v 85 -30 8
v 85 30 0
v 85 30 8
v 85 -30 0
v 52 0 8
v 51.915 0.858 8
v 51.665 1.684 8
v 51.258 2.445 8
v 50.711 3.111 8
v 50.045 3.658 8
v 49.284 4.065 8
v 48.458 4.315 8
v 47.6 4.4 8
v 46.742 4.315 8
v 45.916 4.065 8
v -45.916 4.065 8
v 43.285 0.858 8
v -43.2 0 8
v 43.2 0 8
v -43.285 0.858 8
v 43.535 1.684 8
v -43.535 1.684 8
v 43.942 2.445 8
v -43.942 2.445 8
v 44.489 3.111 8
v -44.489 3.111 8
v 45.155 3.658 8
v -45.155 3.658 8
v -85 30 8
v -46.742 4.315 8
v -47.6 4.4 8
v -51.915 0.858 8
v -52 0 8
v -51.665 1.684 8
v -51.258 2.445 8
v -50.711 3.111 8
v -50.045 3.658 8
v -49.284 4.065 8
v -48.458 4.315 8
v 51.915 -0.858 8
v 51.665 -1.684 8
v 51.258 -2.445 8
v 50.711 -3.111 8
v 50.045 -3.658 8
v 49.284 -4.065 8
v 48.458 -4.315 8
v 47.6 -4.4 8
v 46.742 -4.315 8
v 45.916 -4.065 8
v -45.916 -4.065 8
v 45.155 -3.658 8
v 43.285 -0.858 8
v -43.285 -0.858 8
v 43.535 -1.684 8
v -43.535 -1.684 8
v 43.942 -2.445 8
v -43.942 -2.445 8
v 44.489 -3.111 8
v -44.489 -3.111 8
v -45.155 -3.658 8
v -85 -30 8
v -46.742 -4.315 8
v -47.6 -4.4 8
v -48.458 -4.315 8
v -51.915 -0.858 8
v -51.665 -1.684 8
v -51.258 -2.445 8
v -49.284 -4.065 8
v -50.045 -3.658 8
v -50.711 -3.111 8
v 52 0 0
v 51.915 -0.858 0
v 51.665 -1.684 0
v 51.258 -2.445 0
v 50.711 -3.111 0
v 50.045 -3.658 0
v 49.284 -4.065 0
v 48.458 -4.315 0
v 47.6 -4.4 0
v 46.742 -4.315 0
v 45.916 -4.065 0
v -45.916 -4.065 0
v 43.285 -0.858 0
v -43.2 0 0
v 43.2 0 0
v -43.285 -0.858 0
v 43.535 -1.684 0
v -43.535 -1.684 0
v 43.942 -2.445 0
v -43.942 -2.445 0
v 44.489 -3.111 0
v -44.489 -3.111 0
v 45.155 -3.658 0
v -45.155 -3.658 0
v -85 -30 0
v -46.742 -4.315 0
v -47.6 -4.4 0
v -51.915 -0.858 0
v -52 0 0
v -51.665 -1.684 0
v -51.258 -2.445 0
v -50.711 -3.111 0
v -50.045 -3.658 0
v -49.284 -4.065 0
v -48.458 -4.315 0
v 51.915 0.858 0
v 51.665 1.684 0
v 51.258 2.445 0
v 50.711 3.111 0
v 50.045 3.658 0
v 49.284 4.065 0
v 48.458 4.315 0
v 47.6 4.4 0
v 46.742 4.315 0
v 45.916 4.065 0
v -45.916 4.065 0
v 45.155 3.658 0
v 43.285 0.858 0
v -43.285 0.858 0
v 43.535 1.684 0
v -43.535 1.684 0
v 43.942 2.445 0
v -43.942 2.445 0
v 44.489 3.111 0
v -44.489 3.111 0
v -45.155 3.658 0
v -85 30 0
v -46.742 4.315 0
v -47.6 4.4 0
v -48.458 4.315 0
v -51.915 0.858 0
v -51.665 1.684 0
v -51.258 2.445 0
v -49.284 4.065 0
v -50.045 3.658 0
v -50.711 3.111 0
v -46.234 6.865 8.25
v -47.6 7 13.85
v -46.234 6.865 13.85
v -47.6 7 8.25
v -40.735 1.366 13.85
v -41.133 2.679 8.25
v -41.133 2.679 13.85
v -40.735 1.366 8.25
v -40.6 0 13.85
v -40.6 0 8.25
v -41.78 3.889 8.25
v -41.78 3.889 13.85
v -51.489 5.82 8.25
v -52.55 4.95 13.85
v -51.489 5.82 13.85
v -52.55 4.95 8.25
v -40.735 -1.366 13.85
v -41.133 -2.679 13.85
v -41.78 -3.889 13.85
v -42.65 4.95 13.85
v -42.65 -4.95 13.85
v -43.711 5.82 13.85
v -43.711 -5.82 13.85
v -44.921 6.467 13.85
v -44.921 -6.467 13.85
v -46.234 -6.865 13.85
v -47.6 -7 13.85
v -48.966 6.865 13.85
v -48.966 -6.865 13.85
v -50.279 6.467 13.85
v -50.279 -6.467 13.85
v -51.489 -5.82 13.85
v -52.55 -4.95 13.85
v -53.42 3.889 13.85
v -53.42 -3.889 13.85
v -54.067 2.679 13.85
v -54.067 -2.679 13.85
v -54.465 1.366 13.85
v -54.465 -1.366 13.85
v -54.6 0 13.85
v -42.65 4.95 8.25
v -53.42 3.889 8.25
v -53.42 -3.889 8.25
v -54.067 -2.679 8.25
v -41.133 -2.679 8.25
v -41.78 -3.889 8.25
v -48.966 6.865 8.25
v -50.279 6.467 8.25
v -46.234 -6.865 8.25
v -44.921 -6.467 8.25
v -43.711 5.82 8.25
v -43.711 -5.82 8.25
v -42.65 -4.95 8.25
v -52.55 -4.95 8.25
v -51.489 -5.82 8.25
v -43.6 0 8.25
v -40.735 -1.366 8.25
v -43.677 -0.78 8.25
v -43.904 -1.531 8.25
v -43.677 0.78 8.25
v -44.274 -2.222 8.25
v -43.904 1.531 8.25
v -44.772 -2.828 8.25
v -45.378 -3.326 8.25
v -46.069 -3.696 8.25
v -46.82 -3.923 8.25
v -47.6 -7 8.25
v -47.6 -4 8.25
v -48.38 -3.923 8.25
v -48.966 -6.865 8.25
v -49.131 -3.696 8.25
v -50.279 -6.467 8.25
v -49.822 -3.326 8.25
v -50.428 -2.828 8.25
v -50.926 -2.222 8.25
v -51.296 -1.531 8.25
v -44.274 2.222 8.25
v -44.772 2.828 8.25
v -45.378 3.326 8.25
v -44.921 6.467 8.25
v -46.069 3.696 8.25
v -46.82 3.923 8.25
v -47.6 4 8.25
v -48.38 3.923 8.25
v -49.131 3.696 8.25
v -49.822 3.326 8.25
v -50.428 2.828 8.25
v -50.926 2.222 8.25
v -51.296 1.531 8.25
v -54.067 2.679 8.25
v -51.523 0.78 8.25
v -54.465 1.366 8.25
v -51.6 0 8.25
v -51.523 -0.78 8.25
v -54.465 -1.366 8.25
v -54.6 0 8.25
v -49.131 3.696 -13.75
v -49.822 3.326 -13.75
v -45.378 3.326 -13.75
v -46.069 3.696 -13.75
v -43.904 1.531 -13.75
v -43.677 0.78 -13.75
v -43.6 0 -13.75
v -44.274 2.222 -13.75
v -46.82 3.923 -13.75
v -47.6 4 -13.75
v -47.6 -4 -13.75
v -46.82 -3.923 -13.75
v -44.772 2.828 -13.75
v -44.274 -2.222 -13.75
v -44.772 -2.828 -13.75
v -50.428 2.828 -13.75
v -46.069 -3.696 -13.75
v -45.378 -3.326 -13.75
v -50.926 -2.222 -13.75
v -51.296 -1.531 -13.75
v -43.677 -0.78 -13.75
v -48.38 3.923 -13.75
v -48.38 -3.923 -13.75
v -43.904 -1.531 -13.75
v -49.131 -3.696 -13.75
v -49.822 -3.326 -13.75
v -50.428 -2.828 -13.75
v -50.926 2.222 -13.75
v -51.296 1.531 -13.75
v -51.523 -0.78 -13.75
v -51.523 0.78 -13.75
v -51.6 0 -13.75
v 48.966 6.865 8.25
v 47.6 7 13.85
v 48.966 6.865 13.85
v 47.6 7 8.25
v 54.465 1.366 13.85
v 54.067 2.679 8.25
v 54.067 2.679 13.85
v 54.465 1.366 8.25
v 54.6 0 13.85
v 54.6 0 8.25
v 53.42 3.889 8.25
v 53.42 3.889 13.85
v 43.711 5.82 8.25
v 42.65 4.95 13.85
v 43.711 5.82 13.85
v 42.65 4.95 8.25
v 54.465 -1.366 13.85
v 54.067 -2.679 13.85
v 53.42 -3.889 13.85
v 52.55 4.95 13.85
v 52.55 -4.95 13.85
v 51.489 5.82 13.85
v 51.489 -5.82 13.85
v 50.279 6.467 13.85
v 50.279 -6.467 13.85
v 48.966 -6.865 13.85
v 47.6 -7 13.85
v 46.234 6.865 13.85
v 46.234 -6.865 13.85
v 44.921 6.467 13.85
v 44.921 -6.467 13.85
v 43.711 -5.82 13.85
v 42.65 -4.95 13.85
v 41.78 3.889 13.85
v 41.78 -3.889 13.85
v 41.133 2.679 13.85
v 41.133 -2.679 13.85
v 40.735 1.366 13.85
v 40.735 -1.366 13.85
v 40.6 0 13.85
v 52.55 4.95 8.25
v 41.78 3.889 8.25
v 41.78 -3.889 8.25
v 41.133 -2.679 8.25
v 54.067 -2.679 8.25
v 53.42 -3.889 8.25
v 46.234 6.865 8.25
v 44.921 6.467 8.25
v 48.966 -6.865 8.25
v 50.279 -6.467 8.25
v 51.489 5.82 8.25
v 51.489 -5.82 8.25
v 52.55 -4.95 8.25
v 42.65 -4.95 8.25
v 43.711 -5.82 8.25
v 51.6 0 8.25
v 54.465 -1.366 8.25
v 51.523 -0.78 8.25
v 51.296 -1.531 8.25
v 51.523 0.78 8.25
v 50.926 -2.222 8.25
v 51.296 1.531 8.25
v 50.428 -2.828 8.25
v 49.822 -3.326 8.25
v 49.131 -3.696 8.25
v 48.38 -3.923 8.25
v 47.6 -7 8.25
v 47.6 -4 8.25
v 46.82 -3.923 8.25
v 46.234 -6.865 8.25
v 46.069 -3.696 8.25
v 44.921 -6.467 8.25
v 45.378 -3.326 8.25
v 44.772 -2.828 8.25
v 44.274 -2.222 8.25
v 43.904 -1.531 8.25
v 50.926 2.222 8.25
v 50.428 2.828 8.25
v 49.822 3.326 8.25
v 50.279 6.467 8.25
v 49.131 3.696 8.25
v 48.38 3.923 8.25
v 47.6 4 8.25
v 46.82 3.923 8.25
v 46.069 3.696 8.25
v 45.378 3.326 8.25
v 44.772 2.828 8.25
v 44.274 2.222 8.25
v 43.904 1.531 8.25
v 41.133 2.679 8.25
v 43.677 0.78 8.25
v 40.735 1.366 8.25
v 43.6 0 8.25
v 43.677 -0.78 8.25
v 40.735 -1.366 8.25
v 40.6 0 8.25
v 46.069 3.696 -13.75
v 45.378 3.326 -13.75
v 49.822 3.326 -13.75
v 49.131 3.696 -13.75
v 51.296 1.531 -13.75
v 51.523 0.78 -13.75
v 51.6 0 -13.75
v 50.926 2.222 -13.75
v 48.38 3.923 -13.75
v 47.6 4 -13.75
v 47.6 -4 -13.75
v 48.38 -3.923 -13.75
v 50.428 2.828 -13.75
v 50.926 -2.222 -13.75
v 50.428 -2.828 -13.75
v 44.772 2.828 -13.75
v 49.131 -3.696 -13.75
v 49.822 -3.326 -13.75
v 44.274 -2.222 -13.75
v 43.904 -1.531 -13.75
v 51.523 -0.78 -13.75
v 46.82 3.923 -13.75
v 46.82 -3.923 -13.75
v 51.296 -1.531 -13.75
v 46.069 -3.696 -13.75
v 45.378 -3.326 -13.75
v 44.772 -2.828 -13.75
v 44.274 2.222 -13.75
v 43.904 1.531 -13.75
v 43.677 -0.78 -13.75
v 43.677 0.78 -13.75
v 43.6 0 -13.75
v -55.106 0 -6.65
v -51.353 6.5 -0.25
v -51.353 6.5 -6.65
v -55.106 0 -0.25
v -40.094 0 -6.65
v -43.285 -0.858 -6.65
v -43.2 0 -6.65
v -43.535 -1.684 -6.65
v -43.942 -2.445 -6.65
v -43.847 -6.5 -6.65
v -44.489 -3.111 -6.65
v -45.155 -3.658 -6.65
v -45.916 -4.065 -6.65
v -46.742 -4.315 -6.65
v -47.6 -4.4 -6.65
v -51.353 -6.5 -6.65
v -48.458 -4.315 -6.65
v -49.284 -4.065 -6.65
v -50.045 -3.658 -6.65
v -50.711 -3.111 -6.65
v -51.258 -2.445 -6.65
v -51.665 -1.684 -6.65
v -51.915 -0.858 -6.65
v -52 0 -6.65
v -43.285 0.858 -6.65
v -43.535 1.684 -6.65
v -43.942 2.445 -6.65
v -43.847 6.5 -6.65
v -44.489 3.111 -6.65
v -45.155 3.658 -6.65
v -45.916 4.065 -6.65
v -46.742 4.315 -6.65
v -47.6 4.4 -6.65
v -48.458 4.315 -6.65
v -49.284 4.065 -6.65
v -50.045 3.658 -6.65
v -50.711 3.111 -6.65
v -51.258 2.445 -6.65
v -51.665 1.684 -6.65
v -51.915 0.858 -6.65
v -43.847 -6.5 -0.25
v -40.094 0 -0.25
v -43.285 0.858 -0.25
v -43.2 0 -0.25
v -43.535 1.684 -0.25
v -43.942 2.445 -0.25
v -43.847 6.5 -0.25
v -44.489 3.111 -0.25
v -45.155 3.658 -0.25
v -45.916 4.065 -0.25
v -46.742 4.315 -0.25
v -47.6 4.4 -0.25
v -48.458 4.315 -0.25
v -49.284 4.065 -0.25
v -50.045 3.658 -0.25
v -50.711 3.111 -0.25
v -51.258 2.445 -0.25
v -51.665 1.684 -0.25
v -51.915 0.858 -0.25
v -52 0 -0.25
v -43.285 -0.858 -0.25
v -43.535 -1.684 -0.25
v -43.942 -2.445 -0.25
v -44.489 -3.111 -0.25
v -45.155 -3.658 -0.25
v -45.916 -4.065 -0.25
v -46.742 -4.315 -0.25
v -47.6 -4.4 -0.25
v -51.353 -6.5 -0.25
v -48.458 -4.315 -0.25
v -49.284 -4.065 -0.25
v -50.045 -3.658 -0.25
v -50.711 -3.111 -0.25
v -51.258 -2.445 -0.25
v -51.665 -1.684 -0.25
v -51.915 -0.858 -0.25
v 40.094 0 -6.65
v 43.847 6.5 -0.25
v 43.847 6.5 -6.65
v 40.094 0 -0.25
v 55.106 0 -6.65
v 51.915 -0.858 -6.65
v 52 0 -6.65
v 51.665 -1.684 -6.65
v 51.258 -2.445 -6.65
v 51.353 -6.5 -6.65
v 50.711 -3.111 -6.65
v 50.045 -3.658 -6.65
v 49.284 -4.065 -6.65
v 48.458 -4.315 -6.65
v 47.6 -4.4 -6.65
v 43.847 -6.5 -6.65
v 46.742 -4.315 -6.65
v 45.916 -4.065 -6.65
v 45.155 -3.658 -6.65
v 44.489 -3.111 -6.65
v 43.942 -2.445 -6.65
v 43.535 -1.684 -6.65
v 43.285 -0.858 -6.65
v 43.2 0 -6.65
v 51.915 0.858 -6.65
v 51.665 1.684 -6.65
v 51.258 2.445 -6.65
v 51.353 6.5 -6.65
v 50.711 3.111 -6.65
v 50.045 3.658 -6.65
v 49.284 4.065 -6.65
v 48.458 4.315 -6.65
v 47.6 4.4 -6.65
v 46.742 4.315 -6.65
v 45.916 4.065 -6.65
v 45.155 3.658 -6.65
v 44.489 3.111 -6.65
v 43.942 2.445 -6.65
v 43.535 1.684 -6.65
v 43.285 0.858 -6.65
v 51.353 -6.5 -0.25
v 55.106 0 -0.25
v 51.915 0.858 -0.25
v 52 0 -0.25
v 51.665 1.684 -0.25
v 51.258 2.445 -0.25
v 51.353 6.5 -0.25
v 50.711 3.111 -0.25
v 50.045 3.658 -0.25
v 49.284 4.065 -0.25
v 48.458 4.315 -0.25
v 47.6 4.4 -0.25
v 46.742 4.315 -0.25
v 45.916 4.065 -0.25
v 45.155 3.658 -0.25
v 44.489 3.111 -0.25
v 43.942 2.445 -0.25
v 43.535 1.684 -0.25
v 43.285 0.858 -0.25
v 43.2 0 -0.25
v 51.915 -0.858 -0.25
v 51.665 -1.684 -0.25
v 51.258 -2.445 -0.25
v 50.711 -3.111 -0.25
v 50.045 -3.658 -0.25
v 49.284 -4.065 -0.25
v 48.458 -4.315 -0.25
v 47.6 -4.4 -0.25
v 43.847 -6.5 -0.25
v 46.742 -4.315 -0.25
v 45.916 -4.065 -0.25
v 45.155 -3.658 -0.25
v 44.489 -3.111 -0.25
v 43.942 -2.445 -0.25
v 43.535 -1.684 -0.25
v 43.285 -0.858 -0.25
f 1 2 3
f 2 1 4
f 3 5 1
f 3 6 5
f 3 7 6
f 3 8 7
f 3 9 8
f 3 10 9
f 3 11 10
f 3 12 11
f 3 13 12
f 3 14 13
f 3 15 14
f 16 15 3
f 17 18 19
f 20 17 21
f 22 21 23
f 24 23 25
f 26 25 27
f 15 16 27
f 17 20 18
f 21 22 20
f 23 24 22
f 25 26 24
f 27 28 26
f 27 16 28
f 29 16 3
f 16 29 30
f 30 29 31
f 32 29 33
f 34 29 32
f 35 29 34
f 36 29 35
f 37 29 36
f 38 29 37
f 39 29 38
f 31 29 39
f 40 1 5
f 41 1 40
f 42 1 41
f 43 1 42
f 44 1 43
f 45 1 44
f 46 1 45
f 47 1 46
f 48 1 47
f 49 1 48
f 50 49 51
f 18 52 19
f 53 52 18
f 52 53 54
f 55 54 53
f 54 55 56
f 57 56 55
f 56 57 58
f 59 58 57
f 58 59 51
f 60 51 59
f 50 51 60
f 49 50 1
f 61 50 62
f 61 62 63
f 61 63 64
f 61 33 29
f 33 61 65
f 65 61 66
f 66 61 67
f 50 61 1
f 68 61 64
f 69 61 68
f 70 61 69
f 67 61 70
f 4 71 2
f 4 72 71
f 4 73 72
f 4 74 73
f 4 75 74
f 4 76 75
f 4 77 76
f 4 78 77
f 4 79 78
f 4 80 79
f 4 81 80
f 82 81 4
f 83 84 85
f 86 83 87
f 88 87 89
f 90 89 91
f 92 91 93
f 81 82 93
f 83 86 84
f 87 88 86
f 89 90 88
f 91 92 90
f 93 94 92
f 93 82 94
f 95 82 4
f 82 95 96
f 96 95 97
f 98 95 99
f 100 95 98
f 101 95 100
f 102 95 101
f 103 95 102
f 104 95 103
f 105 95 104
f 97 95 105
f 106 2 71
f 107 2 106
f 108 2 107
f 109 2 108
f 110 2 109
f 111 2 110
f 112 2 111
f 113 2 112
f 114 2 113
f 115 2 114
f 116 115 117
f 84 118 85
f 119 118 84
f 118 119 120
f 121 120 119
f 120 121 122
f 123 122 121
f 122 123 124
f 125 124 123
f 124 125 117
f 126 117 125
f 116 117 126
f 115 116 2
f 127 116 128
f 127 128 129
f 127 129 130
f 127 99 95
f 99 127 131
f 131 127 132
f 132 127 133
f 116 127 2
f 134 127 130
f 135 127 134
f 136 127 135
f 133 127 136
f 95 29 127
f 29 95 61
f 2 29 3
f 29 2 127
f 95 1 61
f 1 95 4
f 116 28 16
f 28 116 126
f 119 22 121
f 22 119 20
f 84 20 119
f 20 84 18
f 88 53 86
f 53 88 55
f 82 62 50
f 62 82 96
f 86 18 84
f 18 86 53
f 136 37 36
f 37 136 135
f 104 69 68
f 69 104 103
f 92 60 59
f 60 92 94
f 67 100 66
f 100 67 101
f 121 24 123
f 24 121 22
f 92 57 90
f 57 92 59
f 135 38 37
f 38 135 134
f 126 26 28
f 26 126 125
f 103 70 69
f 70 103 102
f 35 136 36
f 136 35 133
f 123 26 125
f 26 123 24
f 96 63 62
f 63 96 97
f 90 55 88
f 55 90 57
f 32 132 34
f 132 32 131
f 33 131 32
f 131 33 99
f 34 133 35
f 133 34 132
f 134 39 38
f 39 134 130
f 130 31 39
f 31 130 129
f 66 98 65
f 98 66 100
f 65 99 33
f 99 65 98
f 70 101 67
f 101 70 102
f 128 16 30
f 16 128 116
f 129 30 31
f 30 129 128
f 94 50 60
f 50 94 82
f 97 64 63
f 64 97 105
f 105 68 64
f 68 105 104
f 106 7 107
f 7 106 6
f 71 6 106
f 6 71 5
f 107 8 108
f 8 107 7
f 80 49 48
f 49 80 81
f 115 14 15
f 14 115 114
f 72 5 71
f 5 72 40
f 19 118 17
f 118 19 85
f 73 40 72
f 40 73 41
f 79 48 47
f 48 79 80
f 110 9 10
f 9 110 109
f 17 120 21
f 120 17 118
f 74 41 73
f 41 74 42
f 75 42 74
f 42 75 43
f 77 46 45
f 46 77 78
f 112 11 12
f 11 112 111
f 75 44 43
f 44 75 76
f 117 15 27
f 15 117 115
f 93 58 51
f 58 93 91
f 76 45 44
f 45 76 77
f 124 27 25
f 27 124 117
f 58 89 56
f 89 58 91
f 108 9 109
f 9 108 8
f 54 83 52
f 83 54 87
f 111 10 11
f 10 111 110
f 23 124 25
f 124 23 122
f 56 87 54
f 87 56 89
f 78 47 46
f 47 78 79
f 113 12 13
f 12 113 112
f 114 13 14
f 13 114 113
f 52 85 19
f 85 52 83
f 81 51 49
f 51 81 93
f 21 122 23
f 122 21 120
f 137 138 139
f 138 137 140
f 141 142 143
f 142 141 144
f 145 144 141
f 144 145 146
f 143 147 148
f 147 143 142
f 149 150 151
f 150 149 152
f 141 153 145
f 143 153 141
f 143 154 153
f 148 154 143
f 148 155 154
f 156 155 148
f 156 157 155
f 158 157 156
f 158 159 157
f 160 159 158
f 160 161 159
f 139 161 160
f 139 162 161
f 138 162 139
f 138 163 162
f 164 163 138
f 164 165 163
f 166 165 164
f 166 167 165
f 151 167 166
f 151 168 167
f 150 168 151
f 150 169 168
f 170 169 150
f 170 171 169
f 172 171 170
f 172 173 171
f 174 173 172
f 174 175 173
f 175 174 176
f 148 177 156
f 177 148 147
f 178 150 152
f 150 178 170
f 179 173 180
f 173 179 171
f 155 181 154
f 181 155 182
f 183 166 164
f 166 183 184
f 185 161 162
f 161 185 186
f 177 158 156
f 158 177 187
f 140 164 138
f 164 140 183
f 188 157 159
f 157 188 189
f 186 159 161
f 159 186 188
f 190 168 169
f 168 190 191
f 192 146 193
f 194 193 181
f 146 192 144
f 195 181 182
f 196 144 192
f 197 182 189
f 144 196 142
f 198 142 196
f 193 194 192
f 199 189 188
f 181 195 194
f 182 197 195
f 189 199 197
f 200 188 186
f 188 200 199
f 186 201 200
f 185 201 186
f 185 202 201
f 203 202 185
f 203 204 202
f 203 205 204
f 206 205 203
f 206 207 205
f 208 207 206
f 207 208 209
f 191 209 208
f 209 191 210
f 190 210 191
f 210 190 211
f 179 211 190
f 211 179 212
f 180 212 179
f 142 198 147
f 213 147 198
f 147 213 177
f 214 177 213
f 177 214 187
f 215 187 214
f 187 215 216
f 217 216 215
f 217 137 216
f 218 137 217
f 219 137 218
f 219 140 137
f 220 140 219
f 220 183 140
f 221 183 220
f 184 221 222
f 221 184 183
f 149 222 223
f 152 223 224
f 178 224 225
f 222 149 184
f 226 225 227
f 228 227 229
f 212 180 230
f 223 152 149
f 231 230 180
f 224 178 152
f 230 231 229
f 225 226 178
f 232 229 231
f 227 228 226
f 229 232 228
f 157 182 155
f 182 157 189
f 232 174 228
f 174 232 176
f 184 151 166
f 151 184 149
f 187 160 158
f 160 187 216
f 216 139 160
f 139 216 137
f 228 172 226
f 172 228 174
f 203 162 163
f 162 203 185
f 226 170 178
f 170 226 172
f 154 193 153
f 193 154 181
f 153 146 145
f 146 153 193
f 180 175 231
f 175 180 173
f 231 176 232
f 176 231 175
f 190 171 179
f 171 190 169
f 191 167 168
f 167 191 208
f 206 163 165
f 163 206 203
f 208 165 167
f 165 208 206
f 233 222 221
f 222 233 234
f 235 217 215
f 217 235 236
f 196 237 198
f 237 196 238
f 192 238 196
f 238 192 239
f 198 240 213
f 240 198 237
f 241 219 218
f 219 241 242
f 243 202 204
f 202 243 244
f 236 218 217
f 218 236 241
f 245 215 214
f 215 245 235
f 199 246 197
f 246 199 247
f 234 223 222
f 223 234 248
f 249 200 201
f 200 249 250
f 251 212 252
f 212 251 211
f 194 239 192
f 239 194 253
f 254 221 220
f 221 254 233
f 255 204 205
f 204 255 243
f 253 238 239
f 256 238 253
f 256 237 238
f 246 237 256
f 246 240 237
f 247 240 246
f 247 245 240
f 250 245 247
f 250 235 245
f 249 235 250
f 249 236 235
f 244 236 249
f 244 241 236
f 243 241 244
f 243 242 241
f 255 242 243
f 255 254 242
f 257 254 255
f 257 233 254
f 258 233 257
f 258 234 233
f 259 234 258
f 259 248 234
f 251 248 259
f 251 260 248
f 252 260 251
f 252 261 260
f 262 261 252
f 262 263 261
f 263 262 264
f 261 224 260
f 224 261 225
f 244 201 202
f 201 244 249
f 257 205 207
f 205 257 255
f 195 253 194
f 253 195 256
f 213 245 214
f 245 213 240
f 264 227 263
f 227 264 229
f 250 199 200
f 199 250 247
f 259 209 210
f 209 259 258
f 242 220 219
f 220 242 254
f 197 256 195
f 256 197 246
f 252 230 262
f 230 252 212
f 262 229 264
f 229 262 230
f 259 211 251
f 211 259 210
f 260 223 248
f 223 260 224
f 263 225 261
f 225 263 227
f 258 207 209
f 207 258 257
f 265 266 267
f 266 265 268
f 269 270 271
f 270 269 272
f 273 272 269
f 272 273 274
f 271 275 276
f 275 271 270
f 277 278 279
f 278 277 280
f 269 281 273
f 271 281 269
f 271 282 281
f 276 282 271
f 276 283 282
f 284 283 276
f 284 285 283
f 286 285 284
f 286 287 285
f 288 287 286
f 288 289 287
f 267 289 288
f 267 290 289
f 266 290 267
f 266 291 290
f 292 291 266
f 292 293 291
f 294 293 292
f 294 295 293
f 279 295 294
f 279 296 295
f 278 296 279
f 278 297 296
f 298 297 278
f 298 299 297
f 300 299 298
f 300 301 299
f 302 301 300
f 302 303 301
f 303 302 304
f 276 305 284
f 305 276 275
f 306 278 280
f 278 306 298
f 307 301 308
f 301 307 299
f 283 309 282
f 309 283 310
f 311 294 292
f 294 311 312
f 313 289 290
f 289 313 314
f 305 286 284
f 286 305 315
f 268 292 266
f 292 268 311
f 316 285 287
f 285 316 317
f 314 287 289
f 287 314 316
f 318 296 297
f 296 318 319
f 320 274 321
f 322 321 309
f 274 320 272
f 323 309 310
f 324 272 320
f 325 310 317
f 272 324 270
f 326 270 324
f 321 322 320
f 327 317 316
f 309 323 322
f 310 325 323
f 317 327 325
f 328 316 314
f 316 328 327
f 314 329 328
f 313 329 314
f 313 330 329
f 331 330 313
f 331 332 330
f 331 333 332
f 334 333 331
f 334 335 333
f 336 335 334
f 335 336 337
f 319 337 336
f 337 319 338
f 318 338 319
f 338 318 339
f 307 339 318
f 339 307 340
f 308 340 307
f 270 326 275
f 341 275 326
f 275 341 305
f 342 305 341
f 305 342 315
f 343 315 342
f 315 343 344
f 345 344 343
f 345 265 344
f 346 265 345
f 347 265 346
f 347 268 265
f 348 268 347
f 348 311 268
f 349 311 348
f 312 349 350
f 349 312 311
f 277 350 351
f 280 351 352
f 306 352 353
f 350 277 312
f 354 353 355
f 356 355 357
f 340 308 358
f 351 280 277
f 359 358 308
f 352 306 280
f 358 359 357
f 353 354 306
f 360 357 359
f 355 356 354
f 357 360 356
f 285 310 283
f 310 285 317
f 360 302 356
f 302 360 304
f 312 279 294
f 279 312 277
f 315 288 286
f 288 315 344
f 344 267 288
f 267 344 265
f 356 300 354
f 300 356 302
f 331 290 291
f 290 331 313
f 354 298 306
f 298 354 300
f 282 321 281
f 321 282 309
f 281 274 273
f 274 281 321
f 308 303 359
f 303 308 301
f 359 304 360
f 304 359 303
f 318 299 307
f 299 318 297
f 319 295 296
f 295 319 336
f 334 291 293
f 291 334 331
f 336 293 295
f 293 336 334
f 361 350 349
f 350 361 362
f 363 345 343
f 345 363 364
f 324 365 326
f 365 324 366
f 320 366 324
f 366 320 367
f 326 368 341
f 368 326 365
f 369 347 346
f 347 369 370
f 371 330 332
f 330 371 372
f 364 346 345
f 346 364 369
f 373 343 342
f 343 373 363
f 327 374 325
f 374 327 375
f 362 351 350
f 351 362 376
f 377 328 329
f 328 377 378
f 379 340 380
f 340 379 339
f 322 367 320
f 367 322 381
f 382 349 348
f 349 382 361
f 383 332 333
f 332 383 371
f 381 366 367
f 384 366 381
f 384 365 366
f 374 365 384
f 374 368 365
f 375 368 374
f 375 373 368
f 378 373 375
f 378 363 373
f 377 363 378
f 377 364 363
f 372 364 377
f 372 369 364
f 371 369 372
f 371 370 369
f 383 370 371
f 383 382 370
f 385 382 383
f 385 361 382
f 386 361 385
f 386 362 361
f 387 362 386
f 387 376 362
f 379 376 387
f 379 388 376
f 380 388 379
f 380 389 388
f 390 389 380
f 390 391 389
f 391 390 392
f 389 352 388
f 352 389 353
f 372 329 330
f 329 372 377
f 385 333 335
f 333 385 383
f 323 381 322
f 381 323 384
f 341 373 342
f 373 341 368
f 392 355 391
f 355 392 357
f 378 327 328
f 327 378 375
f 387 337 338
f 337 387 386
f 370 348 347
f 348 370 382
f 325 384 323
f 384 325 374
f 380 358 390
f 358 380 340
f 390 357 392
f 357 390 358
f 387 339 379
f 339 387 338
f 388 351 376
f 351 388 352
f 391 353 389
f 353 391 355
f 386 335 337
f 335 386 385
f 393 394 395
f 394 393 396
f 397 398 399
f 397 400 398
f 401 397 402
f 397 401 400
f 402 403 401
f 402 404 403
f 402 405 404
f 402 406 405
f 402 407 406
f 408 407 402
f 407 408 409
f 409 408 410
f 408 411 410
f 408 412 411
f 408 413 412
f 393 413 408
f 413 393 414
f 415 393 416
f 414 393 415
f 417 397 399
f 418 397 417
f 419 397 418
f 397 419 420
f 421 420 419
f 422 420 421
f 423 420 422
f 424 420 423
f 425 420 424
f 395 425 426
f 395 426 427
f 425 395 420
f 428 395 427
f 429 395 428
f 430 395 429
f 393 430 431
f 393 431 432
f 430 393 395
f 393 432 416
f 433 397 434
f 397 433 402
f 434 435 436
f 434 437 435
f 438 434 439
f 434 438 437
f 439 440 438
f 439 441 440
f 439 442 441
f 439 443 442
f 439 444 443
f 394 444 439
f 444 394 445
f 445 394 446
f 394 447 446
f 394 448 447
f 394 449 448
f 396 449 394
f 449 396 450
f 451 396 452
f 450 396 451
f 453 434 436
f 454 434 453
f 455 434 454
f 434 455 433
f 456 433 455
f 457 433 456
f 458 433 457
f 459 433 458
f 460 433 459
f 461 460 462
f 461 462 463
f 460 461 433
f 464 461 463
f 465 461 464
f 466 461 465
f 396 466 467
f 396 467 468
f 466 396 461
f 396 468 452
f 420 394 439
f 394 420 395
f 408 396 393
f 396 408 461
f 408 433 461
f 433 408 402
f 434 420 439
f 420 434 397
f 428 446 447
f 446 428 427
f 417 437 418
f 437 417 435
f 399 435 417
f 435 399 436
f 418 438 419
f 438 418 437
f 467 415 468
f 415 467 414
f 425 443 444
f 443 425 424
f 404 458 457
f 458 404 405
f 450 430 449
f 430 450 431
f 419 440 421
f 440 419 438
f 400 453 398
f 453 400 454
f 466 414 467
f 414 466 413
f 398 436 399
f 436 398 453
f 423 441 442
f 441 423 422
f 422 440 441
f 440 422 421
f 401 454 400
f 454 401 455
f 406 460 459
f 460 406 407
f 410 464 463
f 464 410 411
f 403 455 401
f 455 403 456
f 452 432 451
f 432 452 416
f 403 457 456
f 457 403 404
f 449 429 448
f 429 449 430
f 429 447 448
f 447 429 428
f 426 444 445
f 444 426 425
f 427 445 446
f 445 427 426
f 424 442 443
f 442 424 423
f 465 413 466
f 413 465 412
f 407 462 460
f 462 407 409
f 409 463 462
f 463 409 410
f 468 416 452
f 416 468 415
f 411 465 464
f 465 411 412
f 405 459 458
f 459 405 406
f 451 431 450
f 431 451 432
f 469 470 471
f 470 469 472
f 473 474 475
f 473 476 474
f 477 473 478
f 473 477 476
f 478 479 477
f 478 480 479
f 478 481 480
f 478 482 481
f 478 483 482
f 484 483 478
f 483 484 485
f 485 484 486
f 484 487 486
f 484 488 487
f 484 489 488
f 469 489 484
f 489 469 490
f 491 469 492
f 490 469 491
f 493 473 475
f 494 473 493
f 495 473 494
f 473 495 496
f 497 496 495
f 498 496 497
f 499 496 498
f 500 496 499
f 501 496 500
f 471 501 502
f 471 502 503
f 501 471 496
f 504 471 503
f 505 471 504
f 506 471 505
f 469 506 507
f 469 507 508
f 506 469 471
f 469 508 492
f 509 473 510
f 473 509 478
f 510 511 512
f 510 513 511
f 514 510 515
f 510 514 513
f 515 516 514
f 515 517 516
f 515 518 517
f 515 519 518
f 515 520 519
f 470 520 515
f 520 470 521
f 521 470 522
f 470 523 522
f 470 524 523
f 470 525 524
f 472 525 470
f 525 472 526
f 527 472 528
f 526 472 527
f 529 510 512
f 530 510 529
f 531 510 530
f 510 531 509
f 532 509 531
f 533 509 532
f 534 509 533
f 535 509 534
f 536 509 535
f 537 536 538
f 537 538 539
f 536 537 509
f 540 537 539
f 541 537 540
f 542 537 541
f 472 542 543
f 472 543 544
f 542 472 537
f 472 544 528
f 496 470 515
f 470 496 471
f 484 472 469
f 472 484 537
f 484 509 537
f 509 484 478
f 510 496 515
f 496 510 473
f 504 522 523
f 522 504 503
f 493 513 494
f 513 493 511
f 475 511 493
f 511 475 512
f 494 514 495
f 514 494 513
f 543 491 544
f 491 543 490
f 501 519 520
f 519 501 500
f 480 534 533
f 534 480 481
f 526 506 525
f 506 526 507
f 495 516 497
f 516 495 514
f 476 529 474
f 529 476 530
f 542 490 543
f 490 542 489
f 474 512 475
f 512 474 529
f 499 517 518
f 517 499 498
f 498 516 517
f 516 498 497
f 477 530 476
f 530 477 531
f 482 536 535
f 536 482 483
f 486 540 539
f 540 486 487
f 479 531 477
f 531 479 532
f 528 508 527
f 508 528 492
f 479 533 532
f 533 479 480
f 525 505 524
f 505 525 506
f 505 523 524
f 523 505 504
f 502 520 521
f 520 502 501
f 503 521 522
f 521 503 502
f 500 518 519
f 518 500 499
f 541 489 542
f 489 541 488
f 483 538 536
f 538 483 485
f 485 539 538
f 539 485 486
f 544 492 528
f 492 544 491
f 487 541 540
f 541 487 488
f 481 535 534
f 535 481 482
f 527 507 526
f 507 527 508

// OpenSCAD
$fn = 32;

// ------------------------------------------------------------------------
// Bolted plate: 170 x 60 x 8 mm plate, 2 fasteners
// Every part is its own module, assembly() places them once.
// ------------------------------------------------------------------------

// --- part 1 ---
module plate() {
  difference() {
    translate([-85, -30, 0]) cube([170, 60, 8]);
    translate([-47.6, 0, -1]) cylinder(h = 10, d = 8.8);
    translate([47.6, 0, -1]) cylinder(h = 10, d = 8.8);
  }
}

// --- part 2 ---
module bolt1() {
  cylinder(h = 5.6, d = 14);
  translate([0, 0, -22]) cylinder(h = 22, d = 8);
}

// --- part 3 ---
module bolt2() {
  cylinder(h = 5.6, d = 14);
  translate([0, 0, -22]) cylinder(h = 22, d = 8);
}

// --- part 4 ---
module nut1() {
  difference() {
    linear_extrude(height = 6.4) polygon(points = [[7.506, 0], [3.753, 6.5], [-3.753, 6.5], [-7.506, 0], [-3.753, -6.5], [3.753, -6.5]]);
    translate([0, 0, -1]) cylinder(h = 8.4, d = 8.8);
  }
}

// --- part 5 ---
module nut2() {
  difference() {
    linear_extrude(height = 6.4) polygon(points = [[7.506, 0], [3.753, 6.5], [-3.753, 6.5], [-7.506, 0], [-3.753, -6.5], [3.753, -6.5]]);
    translate([0, 0, -1]) cylinder(h = 8.4, d = 8.8);
  }
}

// --- assembly ---
module assembly() {
  translate([0, 0, 0]) rotate([0, 0, 0]) plate();
  translate([-47.6, 0, 8.25]) rotate([0, 0, 0]) bolt1();
  translate([47.6, 0, 8.25]) rotate([0, 0, 0]) bolt2();
  translate([-47.6, 0, -6.65]) rotate([0, 0, 0]) nut1();
  translate([47.6, 0, -6.65]) rotate([0, 0, 0]) nut2();
}

assembly();
